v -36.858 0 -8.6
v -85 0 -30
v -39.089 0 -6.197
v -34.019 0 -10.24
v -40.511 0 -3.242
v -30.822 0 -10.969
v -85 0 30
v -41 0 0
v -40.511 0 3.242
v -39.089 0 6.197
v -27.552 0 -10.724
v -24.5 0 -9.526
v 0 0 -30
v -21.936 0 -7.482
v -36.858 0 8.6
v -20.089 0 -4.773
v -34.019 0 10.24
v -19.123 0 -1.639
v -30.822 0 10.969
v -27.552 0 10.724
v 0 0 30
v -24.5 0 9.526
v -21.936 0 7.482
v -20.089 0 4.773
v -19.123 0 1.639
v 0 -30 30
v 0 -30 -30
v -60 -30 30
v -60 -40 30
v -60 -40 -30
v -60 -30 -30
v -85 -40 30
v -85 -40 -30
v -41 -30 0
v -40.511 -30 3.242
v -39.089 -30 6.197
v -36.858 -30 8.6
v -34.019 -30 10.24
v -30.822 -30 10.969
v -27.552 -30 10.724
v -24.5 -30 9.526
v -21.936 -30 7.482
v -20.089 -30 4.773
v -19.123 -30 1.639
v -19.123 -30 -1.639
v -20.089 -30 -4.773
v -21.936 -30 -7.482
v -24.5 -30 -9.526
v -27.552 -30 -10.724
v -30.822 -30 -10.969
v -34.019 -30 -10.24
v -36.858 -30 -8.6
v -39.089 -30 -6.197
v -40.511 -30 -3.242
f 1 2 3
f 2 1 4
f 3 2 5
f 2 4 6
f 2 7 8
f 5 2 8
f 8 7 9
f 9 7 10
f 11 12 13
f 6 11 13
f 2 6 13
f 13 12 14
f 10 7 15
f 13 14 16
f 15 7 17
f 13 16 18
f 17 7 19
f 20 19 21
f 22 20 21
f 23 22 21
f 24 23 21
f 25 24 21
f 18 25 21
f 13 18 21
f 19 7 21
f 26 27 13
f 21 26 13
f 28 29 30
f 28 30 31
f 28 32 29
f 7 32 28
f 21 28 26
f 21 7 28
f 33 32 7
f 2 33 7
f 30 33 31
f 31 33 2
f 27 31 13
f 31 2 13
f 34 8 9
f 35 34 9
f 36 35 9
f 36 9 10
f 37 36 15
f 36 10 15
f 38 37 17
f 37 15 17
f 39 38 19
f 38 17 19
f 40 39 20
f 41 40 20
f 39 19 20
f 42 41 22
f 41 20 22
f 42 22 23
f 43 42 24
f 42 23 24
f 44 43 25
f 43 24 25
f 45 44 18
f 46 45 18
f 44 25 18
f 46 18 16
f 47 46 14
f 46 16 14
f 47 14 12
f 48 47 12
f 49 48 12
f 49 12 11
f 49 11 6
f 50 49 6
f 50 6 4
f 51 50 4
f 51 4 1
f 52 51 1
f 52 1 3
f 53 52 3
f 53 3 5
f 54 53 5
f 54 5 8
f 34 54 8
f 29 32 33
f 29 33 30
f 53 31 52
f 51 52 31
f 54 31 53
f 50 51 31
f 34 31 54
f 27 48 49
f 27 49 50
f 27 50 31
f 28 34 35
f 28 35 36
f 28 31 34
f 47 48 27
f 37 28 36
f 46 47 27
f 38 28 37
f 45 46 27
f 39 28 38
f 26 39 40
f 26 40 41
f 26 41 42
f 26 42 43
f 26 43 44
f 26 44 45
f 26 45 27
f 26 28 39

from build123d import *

# Parameters (mm, degrees)
SKETCH_1_W          = 85
SKETCH_1_H          = 40
EXTRUDE_1_DEPTH     = 30
SKETCH_2_W          = 60
SKETCH_2_H          = 10
CUT_EXTRUDE_2_DEPTH = 112.467484048
SKETCH_3_R          = 11
CUT_EXTRUDE_3_DEPTH = 99.615414617


with BuildPart() as part:
    # 草图1 → 凸台-拉伸1 (new, symmetric)
    with BuildSketch(Plane.XY):
        with Locations((-42.5, -20)):
            Rectangle(SKETCH_1_W, SKETCH_1_H)
    extrude(amount=EXTRUDE_1_DEPTH, both=True)

    # 草图2 → 切除-拉伸2 (cut, through all)
    with BuildSketch(Plane.XY.offset(30)):
        with Locations((-30, -35)):
            Rectangle(SKETCH_2_W, SKETCH_2_H)
    extrude(amount=-CUT_EXTRUDE_2_DEPTH, mode=Mode.SUBTRACT)

    # 草图3 → 切除-拉伸3 (cut, through all)
    with BuildSketch(Plane(origin=(0, 0, 0), x_dir=(1, 0, 0), z_dir=(0, 1, 0))):
        with Locations(Location((-30, 0, 0), (0, 0, 180))):
            Circle(SKETCH_3_R)
    extrude(amount=-CUT_EXTRUDE_3_DEPTH, mode=Mode.SUBTRACT)


solid = part.part
